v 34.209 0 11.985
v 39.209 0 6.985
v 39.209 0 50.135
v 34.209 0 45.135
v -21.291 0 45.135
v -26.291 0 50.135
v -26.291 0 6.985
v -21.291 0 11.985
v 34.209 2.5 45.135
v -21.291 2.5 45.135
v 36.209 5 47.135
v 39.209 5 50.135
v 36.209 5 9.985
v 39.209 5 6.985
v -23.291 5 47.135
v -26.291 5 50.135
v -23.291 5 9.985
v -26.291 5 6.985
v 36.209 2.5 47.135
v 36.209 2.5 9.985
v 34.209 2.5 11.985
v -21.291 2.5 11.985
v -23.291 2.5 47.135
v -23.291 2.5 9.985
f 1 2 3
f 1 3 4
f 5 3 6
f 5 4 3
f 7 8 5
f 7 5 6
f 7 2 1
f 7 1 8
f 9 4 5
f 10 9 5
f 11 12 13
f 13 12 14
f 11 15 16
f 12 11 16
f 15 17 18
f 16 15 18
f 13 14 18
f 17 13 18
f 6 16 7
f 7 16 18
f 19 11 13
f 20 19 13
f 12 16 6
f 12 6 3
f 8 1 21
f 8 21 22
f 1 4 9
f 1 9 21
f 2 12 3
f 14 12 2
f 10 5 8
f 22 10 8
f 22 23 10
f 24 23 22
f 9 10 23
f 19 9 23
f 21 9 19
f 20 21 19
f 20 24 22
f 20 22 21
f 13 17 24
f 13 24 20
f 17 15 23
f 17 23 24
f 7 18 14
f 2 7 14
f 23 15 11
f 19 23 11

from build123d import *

# Parameters (mm, degrees)
BOSS_EXTRUDE1_DEPTH  = 5
SKETCH2_W            = 55.5
SKETCH2_H            = 33.15
CUT_EXTRUDE1_DEPTH   = 10
SKETCH3_W            = 59.5
SKETCH3_H            = 37.15
CUT_EXTRUDE2_DEPTH   = 2.5
SKETCH4_R            = 13.5
CUT_EXTRUDE3_DEPTH   = 2.5
SKETCH8_W            = 89
SKETCH8_H            = 36.5
CUT_EXTRUDE4_DEPTH   = 2.5
BOSS_EXTRUDE4_DEPTH  = 105
SKETCH10_OUTSIDE_W   = 200.486
SKETCH10_OUTSIDE_H   = 145.486
CUT_EXTRUDE5_DEPTH   = 105
SKETCH5_R            = 1.35
SKETCH5_R_2          = 0.95
SKETCH5_R_3          = 1.2
CUT_EXTRUDE6_DEPTH   = 3
SKETCH11_OUTSIDE_W   = 200.486
SKETCH11_OUTSIDE_H   = 145.486
SKETCH11_OUTSIDE_W_2 = 65.5
SKETCH11_OUTSIDE_H_2 = 43.15
CUT_EXTRUDE7_DEPTH   = 10


with BuildPart() as part:
    # Sketch1 → Boss-Extrude1 (new body)
    with BuildSketch(Plane(origin=(0, 0, 0), x_dir=(1, 0, 0), z_dir=(0, 1, 0))):
        with BuildLine():
            Line((40, -52.5), (-40, -52.5))
            ThreePointArc((-40, -52.5), (-68.284271247, -40.784271247), (-80, -12.5))
            Line((-80, -12.5), (-80, 12.5))
            ThreePointArc((-80, 12.5), (-68.284271247, 40.784271247), (-40, 52.5))
            Line((-40, 52.5), (40, 52.5))
            ThreePointArc((40, 52.5), (68.284271247, 40.784271247), (80, 12.5))
            Line((80, 12.5), (80, -12.5))
            ThreePointArc((80, -12.5), (68.284271247, -40.784271247), (40, -52.5))
        make_face()
    extrude(amount=BOSS_EXTRUDE1_DEPTH)

    # Sketch2 → Cut-Extrude1 (cut)
    with BuildSketch(Plane(origin=(0, 0, 0), x_dir=(-1, 0, 0), z_dir=(0, -1, 0))):
        with Locations((-6.459334532, -28.560438218)):
            Rectangle(SKETCH2_W, SKETCH2_H)
    extrude(amount=-CUT_EXTRUDE1_DEPTH, mode=Mode.SUBTRACT)

    # Sketch3 → Cut-Extrude2 (cut)
    with BuildSketch(Plane(origin=(0, 5, 0), x_dir=(1, 0, 0), z_dir=(0, 1, 0))):
        with Locations((6.459334532, -28.560438218)):
            Rectangle(SKETCH3_W, SKETCH3_H)
    extrude(amount=-CUT_EXTRUDE2_DEPTH, mode=Mode.SUBTRACT)

    # Sketch4 → Cut-Extrude3 (cut)
    with BuildSketch(Plane(origin=(0, 5, 0), x_dir=(1, 0, 0), z_dir=(0, 1, 0))):
        with Locations(Location((56.229894871, -16.5, 0), (0, 0, 270))):
            Circle(SKETCH4_R)
        with Locations(Location((-56.229894871, -16.5, 0), (0, 0, 90))):
            Circle(SKETCH4_R)
    extrude(amount=-CUT_EXTRUDE3_DEPTH, mode=Mode.SUBTRACT)

    # Sketch8 → Cut-Extrude4 (cut)
    with BuildSketch(Plane(origin=(0, 5, 0), x_dir=(1, 0, 0), z_dir=(0, 1, 0))):
        with Locations((0.079334532, 25.25)):
            Rectangle(SKETCH8_W, SKETCH8_H)
    extrude(amount=-CUT_EXTRUDE4_DEPTH, mode=Mode.SUBTRACT)

    # Sketch9 → Boss-Extrude4 (add)
    with BuildSketch(Plane.XY.offset(52.5)):
        with BuildLine():
            Line((-80, 0), (-40, 0))
            add(Edge.make_bspline(
                [(-80, 0), (-79.948023713, -3.673692429), (-77.584130198, -11.396455763), (-57.110208015, -20.509844228), (-48.902789398, -1.350898332), (-40, 0)],
                knots=[0, 0, 0, 0, 0.184459574, 0.474643138, 1, 1, 1, 1], degree=3))
        make_face()
        with BuildLine():
            Line((40, 0), (80, 0))
            add(Edge.make_bspline(
                [(80, 0), (79.948023713, -3.673692429), (77.584130198, -11.396455763), (57.110208015, -20.509844228), (48.902789398, -1.350898332), (40, 0)],
                knots=[0, 0, 0, 0, 0.184459574, 0.474643138, 1, 1, 1, 1], degree=3))
        make_face()
    extrude(amount=-BOSS_EXTRUDE4_DEPTH)

    # Sketch10 outside → Cut-Extrude5 (cut)
    with BuildSketch(Plane(origin=(0, 5, 0), x_dir=(1, 0, 0), z_dir=(0, 1, 0))):
        Rectangle(SKETCH10_OUTSIDE_W, SKETCH10_OUTSIDE_H)
        with BuildLine():
            Line((-80, 12.5), (-80, -12.5))
            ThreePointArc((-80, -12.5), (-68.284271247, -40.784271247), (-40, -52.5))
            Line((-40, -52.5), (40, -52.5))
            ThreePointArc((40, -52.5), (68.284271247, -40.784271247), (80, -12.5))
            Line((80, -12.5), (80, 12.5))
            ThreePointArc((80, 12.5), (68.284271247, 40.784271247), (40, 52.5))
            Line((40, 52.5), (-40, 52.5))
            ThreePointArc((-40, 52.5), (-68.284271247, 40.784271247), (-80, 12.5))
        make_face(mode=Mode.SUBTRACT)
    extrude(amount=-CUT_EXTRUDE5_DEPTH, mode=Mode.SUBTRACT)

    # Sketch5 → Cut-Extrude6 (cut)
    with BuildSketch(Plane(origin=(0, 5, 0), x_dir=(1, 0, 0), z_dir=(0, 1, 0))):
        with Locations(Location((66.054894871, -29.425, 0), (0, 0, 270))):
            Circle(SKETCH5_R)
        with Locations(Location((46.404894871, -29.425, 0), (0, 0, 270))):
            Circle(SKETCH5_R)
        with Locations(Location((66.054894871, -3.575, 0), (0, 0, 270))):
            Circle(SKETCH5_R)
        with Locations(Location((46.404894871, -3.575, 0), (0, 0, 270))):
            Circle(SKETCH5_R)
        with Locations(Location((-46.404894871, -29.425, 0), (0, 0, 90))):
            Circle(SKETCH5_R)
        with Locations(Location((-66.054894871, -29.425, 0), (0, 0, 90))):
            Circle(SKETCH5_R)
        with Locations(Location((-66.054894871, -3.575, 0), (0, 0, 90))):
            Circle(SKETCH5_R)
        with Locations(Location((-46.404894871, -3.575, 0), (0, 0, 90))):
            Circle(SKETCH5_R)
        with Locations(Location((46.579334532, 44.5, 0), (0, 0, 270))):
            Circle(SKETCH5_R_2)
        with Locations(Location((46.579334532, 5, 0), (0, 0, 270))):
            Circle(SKETCH5_R_2)
        with Locations(Location((-46.420665468, 5, 0), (0, 0, 270))):
            Circle(SKETCH5_R_2)
        with Locations(Location((-46.420665468, 44.5, 0), (0, 0, 270))):
            Circle(SKETCH5_R_2)
        with Locations(Location((-29.520665468, 0.75, 0), (0, 0, 270))):
            Circle(SKETCH5_R_3)
        with Locations(Location((-29.520665468, -44.95, 0), (0, 0, 270))):
            Circle(SKETCH5_R_3)
        with Locations(Location((36.179334532, 0.75, 0), (0, 0, 270))):
            Circle(SKETCH5_R_3)
    extrude(amount=-CUT_EXTRUDE6_DEPTH, mode=Mode.SUBTRACT)

    # Sketch11 outside → Cut-Extrude7 (cut)
    with BuildSketch(Plane(origin=(0, 5, 0), x_dir=(1, 0, 0), z_dir=(0, 1, 0))):
        Rectangle(SKETCH11_OUTSIDE_W, SKETCH11_OUTSIDE_H)
        with Locations((6.459334532, -28.560438218)):
            Rectangle(SKETCH11_OUTSIDE_W_2, SKETCH11_OUTSIDE_H_2, mode=Mode.SUBTRACT)
    extrude(amount=-CUT_EXTRUDE7_DEPTH, mode=Mode.SUBTRACT)


with BuildPart() as cut_extrude7_kept_piece:
    # of the separate pieces the step leaves, the one the design keeps (cut_extrude7_pieces_kept)
    add(part.part.solids().sort_by_distance((39.209334532, 0, 6.985438218))[0])


solid = cut_extrude7_kept_piece.part
